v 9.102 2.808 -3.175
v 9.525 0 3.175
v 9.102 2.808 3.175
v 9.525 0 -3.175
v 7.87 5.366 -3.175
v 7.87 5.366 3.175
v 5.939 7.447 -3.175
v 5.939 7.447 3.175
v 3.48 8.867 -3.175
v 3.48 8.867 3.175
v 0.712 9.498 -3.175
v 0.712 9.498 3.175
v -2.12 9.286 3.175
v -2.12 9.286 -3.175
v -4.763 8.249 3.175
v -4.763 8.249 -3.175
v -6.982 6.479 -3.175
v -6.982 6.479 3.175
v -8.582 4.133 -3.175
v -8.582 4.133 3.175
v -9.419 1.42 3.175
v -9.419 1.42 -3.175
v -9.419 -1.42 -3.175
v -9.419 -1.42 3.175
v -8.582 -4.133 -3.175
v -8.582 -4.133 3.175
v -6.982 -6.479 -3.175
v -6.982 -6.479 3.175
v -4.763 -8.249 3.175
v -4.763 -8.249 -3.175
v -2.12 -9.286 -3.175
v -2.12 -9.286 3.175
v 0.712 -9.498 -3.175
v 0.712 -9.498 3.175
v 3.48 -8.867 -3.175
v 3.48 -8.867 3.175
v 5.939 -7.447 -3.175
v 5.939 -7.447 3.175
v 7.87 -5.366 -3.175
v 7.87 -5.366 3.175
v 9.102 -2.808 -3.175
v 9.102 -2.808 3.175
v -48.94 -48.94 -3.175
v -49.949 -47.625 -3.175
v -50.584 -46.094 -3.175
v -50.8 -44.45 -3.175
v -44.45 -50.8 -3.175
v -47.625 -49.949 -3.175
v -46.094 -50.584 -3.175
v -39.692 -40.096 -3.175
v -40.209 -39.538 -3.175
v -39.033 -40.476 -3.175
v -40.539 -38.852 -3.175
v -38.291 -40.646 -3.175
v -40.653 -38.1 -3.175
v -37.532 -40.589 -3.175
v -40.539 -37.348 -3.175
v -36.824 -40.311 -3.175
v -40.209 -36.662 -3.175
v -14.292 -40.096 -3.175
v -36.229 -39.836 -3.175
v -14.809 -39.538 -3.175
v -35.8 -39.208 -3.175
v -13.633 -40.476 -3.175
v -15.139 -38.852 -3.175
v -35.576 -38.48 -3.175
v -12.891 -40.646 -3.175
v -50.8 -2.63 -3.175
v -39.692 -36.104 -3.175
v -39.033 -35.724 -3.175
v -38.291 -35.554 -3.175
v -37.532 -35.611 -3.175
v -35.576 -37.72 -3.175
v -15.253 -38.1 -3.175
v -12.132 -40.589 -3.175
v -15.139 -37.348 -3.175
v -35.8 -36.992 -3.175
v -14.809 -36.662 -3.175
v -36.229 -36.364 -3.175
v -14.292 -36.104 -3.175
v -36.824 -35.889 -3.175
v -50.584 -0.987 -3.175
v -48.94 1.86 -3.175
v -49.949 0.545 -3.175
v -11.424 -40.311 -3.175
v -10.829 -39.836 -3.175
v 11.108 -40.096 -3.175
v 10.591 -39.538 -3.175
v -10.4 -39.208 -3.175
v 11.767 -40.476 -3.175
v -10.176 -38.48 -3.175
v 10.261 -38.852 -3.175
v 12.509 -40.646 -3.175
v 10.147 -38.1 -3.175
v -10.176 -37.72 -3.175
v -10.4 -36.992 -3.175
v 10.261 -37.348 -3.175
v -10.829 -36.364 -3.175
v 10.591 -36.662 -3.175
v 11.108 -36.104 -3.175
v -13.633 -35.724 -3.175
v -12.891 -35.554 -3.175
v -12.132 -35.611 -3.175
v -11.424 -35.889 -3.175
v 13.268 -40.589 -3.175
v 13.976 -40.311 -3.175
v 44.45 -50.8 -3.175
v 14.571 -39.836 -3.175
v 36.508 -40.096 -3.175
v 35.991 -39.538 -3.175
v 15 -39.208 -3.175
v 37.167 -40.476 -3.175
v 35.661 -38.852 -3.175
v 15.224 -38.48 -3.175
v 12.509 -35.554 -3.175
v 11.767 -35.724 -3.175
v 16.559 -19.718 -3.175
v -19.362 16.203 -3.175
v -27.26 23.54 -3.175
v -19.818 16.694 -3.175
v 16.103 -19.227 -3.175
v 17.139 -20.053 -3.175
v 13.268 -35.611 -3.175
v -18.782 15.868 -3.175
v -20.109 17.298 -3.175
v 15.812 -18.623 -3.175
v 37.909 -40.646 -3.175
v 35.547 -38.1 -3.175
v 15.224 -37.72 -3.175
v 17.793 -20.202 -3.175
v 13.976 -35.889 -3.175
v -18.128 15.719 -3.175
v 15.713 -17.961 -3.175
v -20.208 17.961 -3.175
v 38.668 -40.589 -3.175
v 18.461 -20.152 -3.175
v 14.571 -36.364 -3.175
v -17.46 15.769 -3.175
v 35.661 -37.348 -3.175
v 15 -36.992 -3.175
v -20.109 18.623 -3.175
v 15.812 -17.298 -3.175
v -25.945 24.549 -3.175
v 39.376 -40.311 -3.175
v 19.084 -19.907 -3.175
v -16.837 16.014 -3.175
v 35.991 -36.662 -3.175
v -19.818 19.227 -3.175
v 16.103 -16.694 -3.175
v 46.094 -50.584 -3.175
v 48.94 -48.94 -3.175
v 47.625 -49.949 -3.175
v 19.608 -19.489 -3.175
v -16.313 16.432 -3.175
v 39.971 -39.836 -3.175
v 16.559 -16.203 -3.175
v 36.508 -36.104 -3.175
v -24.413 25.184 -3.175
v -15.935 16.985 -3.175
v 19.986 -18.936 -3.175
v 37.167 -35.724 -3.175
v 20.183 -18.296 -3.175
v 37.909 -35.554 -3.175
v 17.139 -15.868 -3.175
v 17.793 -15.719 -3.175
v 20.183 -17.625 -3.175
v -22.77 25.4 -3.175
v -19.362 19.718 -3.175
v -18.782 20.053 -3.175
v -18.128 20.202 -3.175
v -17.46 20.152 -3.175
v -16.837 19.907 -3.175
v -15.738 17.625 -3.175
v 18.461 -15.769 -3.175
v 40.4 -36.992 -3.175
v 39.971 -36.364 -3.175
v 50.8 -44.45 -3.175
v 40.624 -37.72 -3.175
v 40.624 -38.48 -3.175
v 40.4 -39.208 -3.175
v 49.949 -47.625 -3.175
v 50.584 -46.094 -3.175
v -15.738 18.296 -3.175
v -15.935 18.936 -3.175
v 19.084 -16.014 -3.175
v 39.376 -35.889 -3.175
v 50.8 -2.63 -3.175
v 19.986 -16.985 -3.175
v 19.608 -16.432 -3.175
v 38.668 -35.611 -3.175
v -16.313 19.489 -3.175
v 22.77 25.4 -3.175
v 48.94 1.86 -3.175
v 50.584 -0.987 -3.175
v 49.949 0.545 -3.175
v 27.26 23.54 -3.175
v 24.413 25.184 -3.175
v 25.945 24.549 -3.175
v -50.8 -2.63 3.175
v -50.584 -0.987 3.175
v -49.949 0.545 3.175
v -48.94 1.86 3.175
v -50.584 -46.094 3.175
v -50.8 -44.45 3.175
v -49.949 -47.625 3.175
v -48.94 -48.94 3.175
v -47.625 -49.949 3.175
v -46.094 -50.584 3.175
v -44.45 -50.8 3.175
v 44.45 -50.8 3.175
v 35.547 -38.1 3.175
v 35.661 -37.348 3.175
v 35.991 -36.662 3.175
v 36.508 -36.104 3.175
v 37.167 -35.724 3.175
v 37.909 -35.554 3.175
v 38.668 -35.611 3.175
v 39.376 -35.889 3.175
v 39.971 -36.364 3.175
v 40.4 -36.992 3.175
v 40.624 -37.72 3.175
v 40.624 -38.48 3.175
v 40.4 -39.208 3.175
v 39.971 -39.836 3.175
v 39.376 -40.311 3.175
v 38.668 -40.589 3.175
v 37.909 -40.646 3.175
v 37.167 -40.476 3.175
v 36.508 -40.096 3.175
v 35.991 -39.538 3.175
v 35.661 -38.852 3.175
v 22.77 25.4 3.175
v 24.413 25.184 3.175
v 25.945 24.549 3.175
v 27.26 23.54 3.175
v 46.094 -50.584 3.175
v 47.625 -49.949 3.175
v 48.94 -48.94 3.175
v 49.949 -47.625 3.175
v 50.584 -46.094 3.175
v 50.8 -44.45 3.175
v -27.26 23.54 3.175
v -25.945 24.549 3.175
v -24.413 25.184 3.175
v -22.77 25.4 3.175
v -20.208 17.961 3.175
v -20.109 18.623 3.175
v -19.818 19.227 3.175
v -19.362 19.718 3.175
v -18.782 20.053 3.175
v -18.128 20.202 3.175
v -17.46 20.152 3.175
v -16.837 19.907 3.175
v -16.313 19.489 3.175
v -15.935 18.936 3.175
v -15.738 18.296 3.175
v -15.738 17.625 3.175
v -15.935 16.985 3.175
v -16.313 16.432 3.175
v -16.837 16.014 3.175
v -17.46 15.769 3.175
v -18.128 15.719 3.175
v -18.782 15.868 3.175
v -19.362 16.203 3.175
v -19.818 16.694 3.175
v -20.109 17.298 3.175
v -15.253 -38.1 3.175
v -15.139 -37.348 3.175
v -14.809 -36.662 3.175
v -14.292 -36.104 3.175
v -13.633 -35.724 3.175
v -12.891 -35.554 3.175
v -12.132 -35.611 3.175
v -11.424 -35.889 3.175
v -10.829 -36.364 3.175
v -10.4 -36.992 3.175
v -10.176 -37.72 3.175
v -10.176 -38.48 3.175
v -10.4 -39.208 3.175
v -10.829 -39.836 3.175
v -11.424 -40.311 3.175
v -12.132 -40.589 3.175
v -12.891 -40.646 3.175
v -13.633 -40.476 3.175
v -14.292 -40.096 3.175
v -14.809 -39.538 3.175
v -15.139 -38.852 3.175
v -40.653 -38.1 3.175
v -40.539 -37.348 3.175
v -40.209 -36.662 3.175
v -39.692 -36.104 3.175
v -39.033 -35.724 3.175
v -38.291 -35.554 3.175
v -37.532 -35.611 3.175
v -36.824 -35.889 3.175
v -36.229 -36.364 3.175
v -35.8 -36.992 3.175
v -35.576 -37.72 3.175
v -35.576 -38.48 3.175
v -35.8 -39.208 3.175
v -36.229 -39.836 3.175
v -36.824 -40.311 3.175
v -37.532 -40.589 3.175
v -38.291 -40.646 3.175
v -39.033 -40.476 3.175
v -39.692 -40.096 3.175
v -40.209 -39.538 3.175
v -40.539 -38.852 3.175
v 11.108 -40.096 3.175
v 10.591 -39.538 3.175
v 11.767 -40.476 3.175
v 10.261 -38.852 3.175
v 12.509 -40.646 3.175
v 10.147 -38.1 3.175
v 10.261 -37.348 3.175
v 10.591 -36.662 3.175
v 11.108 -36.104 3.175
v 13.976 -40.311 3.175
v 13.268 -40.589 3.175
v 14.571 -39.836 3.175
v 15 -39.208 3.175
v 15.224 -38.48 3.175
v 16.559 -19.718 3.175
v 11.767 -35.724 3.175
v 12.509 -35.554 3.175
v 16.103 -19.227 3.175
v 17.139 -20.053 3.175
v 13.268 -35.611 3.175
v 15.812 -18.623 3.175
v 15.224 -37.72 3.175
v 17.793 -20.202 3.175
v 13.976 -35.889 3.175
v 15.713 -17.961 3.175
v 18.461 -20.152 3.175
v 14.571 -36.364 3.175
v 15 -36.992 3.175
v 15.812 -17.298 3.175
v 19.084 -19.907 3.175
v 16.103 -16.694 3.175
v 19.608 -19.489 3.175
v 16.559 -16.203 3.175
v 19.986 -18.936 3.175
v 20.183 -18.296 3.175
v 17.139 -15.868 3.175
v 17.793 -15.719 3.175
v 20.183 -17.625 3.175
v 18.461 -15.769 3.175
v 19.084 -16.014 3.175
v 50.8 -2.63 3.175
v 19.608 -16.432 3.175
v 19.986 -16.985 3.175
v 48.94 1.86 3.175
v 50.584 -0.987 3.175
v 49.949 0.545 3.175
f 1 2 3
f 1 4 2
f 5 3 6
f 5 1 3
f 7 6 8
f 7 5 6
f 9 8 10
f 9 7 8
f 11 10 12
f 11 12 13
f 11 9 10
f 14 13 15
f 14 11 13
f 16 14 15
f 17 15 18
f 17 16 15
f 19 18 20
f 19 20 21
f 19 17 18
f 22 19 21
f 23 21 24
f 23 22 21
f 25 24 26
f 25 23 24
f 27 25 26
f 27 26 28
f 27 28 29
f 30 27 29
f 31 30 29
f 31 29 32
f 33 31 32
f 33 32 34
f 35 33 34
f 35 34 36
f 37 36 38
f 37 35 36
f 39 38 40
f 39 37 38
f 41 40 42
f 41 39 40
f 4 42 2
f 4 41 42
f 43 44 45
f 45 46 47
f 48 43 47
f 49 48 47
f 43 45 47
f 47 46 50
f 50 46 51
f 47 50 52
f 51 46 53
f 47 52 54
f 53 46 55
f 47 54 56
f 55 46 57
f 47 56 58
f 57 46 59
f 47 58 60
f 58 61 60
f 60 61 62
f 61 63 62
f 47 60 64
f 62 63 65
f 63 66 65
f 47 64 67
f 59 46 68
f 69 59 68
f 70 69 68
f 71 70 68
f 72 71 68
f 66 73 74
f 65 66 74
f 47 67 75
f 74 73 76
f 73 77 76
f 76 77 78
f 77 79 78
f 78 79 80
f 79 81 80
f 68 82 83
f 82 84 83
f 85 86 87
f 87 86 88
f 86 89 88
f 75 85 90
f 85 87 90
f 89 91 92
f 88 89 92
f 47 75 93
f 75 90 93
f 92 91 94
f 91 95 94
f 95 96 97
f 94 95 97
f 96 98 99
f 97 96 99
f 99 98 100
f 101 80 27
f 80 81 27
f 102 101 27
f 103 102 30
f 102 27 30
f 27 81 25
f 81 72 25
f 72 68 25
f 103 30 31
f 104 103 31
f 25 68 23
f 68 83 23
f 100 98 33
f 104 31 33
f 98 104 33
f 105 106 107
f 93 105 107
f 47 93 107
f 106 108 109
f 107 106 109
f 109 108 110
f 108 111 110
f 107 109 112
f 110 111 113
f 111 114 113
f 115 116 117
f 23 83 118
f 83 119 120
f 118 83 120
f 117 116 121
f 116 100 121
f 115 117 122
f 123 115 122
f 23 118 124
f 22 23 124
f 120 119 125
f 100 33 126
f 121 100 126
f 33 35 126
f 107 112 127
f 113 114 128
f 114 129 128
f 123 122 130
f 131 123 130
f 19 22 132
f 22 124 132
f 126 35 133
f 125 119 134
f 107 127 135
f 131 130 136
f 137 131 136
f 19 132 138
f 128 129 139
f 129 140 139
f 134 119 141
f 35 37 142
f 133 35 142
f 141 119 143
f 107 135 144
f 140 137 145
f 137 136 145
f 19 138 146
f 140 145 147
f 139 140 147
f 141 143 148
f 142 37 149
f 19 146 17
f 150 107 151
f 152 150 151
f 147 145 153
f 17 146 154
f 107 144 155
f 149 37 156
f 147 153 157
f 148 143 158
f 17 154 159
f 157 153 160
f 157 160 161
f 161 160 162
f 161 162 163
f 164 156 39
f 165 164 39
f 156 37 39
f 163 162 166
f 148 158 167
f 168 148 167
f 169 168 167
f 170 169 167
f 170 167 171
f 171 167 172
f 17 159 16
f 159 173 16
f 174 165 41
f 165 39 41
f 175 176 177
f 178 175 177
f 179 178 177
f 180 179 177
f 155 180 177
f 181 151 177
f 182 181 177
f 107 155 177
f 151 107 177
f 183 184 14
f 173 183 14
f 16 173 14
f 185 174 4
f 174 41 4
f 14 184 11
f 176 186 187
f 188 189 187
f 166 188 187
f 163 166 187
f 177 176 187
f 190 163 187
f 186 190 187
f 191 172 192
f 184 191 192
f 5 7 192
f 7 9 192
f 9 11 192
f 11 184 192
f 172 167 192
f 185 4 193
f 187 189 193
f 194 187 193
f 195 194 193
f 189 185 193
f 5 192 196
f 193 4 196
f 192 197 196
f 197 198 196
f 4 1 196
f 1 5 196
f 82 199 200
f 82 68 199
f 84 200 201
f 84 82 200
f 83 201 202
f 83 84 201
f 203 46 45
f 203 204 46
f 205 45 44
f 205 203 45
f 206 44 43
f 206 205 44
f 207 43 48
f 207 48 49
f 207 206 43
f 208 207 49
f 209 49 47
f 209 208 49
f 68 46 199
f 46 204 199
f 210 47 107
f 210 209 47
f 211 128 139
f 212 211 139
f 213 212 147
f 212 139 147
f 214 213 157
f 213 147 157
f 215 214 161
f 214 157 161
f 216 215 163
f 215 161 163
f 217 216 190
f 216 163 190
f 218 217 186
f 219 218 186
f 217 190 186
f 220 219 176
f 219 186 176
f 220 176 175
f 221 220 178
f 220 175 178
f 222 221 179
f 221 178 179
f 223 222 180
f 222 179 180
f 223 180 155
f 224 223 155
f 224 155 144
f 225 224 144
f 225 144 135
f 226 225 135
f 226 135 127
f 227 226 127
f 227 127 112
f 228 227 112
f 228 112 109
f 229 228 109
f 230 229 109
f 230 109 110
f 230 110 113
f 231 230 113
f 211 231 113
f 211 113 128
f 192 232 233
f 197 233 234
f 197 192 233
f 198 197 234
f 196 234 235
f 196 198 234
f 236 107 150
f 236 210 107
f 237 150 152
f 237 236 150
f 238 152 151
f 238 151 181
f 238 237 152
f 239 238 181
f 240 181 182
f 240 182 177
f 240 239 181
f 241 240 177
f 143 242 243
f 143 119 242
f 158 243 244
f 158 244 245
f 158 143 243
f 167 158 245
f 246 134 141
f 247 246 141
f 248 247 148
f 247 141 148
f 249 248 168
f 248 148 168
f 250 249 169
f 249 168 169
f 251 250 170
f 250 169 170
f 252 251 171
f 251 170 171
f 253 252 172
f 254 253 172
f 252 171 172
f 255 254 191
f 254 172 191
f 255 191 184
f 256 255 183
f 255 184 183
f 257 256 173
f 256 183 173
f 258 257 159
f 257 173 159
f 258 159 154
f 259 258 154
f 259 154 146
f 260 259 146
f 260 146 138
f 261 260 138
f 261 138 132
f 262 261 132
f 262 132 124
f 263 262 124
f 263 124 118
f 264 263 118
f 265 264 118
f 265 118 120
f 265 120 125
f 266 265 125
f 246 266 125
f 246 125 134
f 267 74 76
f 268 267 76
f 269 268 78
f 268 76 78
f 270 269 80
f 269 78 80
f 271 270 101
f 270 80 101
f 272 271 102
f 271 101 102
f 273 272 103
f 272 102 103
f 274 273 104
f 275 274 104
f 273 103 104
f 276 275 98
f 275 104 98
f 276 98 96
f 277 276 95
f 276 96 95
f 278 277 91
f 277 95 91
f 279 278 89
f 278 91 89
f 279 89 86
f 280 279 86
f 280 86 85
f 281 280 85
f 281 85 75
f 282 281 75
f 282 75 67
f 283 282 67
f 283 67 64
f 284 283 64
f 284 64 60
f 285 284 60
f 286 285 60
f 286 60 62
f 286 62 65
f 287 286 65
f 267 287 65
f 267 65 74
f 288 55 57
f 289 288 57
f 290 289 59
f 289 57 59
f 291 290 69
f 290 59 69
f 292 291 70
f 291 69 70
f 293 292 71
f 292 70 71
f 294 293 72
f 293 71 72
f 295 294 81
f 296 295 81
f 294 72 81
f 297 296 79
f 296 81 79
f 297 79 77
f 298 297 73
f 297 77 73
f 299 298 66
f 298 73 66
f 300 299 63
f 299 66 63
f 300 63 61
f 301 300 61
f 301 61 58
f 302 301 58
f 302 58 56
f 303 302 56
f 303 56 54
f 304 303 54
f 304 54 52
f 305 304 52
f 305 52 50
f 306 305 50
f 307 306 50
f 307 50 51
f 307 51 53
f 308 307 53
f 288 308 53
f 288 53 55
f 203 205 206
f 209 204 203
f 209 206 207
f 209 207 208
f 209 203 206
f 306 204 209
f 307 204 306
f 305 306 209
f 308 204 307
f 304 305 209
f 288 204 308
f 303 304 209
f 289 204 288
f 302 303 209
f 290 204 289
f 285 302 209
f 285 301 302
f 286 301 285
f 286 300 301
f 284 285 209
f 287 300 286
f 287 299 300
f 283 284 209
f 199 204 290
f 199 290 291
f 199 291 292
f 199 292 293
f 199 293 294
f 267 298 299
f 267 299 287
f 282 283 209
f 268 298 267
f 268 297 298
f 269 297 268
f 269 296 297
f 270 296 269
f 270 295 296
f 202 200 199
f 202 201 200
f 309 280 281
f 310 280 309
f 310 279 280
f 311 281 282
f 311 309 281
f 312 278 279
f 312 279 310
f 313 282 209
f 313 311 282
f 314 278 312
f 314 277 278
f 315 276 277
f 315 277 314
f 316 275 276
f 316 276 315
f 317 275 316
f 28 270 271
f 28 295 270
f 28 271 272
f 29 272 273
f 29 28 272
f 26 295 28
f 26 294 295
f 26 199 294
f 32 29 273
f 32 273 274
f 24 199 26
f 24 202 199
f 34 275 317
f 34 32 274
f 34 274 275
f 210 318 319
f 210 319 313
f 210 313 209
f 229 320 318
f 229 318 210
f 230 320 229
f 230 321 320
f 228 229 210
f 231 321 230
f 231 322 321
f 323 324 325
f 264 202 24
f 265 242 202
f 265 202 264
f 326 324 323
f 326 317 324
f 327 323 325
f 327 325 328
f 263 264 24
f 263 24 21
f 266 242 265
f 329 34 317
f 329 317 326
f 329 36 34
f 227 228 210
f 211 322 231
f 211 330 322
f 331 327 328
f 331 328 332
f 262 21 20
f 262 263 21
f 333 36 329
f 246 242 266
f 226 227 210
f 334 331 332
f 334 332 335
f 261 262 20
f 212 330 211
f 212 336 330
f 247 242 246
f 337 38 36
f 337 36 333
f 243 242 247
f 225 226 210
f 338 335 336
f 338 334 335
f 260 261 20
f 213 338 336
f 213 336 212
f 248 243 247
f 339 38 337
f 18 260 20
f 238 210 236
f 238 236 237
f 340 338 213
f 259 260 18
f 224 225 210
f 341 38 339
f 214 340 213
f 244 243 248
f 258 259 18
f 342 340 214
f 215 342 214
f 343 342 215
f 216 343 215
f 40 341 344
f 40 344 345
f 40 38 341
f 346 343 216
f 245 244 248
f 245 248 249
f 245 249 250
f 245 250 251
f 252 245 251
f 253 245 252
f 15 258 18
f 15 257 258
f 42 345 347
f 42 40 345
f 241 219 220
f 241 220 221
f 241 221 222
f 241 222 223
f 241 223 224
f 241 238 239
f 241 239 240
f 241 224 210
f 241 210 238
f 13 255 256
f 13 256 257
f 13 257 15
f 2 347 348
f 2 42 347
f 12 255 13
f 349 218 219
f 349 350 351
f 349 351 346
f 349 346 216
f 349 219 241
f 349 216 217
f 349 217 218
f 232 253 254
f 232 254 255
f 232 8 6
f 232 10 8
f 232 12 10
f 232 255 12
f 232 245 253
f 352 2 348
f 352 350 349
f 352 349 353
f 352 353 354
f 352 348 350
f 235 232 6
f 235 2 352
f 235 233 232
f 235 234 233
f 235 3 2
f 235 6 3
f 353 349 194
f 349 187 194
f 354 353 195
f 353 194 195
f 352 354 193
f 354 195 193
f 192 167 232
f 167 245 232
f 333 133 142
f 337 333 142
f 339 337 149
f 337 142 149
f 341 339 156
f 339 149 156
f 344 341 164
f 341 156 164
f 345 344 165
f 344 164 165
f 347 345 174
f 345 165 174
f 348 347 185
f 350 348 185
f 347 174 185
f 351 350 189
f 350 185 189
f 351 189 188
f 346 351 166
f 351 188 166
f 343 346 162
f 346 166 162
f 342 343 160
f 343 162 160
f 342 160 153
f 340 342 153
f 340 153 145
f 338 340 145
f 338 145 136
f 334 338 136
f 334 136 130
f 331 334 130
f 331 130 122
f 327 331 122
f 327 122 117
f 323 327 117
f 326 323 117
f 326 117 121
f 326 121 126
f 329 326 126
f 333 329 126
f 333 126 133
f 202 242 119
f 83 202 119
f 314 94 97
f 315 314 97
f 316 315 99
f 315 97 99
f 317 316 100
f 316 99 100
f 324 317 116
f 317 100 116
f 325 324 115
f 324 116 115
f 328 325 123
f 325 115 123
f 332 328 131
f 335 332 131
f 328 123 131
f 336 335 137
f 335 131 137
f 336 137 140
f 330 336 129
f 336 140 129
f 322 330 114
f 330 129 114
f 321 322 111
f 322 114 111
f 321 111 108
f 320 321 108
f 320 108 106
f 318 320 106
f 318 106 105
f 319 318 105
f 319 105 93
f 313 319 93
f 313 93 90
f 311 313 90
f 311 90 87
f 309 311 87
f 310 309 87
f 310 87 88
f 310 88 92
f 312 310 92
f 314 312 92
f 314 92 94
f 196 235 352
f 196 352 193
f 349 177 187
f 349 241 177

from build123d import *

# Parameters (mm, degrees)
SKETCH1_W              = 101.6
SKETCH1_H              = 76.2
SKETCH1_R              = 9.525
BOSS_EXTRUDE1_DEPTH    = 3.175
F_8_CLEARANCE_HOLE1_D  = 4.4958
CHAMFER1_SIZE          = 25.4
F_10_CLEARANCE_HOLE2_D = 5.1054
FILLET1_R              = 6.35


with BuildPart() as part:
    # Sketch1 → Boss-Extrude1 (new, symmetric)
    with BuildSketch(Plane.XY):
        with Locations((0, -12.7)):
            Rectangle(SKETCH1_W, SKETCH1_H)
        Circle(SKETCH1_R, mode=Mode.SUBTRACT)
    extrude(amount=BOSS_EXTRUDE1_DEPTH, both=True)

    # #8 Clearance Hole1 (through all)
    with Locations(Plane.XY.offset(3.175)):
        with Locations((-17.960512242, 17.960512242), (17.960512242, -17.960512242)):
            Hole(F_8_CLEARANCE_HOLE1_D / 2)

    # Chamfer1
    chamfer1_edges = [part.edges().sort_by_distance(p)[0] for p in [
        (-50.8, 25.4, 0),
        (50.8, 25.4, 0),
    ]]
    chamfer(chamfer1_edges, length=CHAMFER1_SIZE)

    # #10 Clearance Hole2 (through all)
    with Locations(Plane.XY.offset(3.175)):
        with Locations((-38.1, -38.1), (-12.7, -38.1), (12.7, -38.1), (38.1, -38.1)):
            Hole(F_10_CLEARANCE_HOLE2_D / 2)

    # Fillet1
    fillet1_edges = [part.edges().sort_by_distance(p)[0] for p in [
        (-25.4, 25.4, 0),
        (25.4, 25.4, 0),
        (50.8, 0, 0),
        (-50.8, 0, 0),
        (50.8, -50.8, 0),
        (-50.8, -50.8, 0),
    ]]
    fillet(fillet1_edges, radius=FILLET1_R)


solid = part.part
